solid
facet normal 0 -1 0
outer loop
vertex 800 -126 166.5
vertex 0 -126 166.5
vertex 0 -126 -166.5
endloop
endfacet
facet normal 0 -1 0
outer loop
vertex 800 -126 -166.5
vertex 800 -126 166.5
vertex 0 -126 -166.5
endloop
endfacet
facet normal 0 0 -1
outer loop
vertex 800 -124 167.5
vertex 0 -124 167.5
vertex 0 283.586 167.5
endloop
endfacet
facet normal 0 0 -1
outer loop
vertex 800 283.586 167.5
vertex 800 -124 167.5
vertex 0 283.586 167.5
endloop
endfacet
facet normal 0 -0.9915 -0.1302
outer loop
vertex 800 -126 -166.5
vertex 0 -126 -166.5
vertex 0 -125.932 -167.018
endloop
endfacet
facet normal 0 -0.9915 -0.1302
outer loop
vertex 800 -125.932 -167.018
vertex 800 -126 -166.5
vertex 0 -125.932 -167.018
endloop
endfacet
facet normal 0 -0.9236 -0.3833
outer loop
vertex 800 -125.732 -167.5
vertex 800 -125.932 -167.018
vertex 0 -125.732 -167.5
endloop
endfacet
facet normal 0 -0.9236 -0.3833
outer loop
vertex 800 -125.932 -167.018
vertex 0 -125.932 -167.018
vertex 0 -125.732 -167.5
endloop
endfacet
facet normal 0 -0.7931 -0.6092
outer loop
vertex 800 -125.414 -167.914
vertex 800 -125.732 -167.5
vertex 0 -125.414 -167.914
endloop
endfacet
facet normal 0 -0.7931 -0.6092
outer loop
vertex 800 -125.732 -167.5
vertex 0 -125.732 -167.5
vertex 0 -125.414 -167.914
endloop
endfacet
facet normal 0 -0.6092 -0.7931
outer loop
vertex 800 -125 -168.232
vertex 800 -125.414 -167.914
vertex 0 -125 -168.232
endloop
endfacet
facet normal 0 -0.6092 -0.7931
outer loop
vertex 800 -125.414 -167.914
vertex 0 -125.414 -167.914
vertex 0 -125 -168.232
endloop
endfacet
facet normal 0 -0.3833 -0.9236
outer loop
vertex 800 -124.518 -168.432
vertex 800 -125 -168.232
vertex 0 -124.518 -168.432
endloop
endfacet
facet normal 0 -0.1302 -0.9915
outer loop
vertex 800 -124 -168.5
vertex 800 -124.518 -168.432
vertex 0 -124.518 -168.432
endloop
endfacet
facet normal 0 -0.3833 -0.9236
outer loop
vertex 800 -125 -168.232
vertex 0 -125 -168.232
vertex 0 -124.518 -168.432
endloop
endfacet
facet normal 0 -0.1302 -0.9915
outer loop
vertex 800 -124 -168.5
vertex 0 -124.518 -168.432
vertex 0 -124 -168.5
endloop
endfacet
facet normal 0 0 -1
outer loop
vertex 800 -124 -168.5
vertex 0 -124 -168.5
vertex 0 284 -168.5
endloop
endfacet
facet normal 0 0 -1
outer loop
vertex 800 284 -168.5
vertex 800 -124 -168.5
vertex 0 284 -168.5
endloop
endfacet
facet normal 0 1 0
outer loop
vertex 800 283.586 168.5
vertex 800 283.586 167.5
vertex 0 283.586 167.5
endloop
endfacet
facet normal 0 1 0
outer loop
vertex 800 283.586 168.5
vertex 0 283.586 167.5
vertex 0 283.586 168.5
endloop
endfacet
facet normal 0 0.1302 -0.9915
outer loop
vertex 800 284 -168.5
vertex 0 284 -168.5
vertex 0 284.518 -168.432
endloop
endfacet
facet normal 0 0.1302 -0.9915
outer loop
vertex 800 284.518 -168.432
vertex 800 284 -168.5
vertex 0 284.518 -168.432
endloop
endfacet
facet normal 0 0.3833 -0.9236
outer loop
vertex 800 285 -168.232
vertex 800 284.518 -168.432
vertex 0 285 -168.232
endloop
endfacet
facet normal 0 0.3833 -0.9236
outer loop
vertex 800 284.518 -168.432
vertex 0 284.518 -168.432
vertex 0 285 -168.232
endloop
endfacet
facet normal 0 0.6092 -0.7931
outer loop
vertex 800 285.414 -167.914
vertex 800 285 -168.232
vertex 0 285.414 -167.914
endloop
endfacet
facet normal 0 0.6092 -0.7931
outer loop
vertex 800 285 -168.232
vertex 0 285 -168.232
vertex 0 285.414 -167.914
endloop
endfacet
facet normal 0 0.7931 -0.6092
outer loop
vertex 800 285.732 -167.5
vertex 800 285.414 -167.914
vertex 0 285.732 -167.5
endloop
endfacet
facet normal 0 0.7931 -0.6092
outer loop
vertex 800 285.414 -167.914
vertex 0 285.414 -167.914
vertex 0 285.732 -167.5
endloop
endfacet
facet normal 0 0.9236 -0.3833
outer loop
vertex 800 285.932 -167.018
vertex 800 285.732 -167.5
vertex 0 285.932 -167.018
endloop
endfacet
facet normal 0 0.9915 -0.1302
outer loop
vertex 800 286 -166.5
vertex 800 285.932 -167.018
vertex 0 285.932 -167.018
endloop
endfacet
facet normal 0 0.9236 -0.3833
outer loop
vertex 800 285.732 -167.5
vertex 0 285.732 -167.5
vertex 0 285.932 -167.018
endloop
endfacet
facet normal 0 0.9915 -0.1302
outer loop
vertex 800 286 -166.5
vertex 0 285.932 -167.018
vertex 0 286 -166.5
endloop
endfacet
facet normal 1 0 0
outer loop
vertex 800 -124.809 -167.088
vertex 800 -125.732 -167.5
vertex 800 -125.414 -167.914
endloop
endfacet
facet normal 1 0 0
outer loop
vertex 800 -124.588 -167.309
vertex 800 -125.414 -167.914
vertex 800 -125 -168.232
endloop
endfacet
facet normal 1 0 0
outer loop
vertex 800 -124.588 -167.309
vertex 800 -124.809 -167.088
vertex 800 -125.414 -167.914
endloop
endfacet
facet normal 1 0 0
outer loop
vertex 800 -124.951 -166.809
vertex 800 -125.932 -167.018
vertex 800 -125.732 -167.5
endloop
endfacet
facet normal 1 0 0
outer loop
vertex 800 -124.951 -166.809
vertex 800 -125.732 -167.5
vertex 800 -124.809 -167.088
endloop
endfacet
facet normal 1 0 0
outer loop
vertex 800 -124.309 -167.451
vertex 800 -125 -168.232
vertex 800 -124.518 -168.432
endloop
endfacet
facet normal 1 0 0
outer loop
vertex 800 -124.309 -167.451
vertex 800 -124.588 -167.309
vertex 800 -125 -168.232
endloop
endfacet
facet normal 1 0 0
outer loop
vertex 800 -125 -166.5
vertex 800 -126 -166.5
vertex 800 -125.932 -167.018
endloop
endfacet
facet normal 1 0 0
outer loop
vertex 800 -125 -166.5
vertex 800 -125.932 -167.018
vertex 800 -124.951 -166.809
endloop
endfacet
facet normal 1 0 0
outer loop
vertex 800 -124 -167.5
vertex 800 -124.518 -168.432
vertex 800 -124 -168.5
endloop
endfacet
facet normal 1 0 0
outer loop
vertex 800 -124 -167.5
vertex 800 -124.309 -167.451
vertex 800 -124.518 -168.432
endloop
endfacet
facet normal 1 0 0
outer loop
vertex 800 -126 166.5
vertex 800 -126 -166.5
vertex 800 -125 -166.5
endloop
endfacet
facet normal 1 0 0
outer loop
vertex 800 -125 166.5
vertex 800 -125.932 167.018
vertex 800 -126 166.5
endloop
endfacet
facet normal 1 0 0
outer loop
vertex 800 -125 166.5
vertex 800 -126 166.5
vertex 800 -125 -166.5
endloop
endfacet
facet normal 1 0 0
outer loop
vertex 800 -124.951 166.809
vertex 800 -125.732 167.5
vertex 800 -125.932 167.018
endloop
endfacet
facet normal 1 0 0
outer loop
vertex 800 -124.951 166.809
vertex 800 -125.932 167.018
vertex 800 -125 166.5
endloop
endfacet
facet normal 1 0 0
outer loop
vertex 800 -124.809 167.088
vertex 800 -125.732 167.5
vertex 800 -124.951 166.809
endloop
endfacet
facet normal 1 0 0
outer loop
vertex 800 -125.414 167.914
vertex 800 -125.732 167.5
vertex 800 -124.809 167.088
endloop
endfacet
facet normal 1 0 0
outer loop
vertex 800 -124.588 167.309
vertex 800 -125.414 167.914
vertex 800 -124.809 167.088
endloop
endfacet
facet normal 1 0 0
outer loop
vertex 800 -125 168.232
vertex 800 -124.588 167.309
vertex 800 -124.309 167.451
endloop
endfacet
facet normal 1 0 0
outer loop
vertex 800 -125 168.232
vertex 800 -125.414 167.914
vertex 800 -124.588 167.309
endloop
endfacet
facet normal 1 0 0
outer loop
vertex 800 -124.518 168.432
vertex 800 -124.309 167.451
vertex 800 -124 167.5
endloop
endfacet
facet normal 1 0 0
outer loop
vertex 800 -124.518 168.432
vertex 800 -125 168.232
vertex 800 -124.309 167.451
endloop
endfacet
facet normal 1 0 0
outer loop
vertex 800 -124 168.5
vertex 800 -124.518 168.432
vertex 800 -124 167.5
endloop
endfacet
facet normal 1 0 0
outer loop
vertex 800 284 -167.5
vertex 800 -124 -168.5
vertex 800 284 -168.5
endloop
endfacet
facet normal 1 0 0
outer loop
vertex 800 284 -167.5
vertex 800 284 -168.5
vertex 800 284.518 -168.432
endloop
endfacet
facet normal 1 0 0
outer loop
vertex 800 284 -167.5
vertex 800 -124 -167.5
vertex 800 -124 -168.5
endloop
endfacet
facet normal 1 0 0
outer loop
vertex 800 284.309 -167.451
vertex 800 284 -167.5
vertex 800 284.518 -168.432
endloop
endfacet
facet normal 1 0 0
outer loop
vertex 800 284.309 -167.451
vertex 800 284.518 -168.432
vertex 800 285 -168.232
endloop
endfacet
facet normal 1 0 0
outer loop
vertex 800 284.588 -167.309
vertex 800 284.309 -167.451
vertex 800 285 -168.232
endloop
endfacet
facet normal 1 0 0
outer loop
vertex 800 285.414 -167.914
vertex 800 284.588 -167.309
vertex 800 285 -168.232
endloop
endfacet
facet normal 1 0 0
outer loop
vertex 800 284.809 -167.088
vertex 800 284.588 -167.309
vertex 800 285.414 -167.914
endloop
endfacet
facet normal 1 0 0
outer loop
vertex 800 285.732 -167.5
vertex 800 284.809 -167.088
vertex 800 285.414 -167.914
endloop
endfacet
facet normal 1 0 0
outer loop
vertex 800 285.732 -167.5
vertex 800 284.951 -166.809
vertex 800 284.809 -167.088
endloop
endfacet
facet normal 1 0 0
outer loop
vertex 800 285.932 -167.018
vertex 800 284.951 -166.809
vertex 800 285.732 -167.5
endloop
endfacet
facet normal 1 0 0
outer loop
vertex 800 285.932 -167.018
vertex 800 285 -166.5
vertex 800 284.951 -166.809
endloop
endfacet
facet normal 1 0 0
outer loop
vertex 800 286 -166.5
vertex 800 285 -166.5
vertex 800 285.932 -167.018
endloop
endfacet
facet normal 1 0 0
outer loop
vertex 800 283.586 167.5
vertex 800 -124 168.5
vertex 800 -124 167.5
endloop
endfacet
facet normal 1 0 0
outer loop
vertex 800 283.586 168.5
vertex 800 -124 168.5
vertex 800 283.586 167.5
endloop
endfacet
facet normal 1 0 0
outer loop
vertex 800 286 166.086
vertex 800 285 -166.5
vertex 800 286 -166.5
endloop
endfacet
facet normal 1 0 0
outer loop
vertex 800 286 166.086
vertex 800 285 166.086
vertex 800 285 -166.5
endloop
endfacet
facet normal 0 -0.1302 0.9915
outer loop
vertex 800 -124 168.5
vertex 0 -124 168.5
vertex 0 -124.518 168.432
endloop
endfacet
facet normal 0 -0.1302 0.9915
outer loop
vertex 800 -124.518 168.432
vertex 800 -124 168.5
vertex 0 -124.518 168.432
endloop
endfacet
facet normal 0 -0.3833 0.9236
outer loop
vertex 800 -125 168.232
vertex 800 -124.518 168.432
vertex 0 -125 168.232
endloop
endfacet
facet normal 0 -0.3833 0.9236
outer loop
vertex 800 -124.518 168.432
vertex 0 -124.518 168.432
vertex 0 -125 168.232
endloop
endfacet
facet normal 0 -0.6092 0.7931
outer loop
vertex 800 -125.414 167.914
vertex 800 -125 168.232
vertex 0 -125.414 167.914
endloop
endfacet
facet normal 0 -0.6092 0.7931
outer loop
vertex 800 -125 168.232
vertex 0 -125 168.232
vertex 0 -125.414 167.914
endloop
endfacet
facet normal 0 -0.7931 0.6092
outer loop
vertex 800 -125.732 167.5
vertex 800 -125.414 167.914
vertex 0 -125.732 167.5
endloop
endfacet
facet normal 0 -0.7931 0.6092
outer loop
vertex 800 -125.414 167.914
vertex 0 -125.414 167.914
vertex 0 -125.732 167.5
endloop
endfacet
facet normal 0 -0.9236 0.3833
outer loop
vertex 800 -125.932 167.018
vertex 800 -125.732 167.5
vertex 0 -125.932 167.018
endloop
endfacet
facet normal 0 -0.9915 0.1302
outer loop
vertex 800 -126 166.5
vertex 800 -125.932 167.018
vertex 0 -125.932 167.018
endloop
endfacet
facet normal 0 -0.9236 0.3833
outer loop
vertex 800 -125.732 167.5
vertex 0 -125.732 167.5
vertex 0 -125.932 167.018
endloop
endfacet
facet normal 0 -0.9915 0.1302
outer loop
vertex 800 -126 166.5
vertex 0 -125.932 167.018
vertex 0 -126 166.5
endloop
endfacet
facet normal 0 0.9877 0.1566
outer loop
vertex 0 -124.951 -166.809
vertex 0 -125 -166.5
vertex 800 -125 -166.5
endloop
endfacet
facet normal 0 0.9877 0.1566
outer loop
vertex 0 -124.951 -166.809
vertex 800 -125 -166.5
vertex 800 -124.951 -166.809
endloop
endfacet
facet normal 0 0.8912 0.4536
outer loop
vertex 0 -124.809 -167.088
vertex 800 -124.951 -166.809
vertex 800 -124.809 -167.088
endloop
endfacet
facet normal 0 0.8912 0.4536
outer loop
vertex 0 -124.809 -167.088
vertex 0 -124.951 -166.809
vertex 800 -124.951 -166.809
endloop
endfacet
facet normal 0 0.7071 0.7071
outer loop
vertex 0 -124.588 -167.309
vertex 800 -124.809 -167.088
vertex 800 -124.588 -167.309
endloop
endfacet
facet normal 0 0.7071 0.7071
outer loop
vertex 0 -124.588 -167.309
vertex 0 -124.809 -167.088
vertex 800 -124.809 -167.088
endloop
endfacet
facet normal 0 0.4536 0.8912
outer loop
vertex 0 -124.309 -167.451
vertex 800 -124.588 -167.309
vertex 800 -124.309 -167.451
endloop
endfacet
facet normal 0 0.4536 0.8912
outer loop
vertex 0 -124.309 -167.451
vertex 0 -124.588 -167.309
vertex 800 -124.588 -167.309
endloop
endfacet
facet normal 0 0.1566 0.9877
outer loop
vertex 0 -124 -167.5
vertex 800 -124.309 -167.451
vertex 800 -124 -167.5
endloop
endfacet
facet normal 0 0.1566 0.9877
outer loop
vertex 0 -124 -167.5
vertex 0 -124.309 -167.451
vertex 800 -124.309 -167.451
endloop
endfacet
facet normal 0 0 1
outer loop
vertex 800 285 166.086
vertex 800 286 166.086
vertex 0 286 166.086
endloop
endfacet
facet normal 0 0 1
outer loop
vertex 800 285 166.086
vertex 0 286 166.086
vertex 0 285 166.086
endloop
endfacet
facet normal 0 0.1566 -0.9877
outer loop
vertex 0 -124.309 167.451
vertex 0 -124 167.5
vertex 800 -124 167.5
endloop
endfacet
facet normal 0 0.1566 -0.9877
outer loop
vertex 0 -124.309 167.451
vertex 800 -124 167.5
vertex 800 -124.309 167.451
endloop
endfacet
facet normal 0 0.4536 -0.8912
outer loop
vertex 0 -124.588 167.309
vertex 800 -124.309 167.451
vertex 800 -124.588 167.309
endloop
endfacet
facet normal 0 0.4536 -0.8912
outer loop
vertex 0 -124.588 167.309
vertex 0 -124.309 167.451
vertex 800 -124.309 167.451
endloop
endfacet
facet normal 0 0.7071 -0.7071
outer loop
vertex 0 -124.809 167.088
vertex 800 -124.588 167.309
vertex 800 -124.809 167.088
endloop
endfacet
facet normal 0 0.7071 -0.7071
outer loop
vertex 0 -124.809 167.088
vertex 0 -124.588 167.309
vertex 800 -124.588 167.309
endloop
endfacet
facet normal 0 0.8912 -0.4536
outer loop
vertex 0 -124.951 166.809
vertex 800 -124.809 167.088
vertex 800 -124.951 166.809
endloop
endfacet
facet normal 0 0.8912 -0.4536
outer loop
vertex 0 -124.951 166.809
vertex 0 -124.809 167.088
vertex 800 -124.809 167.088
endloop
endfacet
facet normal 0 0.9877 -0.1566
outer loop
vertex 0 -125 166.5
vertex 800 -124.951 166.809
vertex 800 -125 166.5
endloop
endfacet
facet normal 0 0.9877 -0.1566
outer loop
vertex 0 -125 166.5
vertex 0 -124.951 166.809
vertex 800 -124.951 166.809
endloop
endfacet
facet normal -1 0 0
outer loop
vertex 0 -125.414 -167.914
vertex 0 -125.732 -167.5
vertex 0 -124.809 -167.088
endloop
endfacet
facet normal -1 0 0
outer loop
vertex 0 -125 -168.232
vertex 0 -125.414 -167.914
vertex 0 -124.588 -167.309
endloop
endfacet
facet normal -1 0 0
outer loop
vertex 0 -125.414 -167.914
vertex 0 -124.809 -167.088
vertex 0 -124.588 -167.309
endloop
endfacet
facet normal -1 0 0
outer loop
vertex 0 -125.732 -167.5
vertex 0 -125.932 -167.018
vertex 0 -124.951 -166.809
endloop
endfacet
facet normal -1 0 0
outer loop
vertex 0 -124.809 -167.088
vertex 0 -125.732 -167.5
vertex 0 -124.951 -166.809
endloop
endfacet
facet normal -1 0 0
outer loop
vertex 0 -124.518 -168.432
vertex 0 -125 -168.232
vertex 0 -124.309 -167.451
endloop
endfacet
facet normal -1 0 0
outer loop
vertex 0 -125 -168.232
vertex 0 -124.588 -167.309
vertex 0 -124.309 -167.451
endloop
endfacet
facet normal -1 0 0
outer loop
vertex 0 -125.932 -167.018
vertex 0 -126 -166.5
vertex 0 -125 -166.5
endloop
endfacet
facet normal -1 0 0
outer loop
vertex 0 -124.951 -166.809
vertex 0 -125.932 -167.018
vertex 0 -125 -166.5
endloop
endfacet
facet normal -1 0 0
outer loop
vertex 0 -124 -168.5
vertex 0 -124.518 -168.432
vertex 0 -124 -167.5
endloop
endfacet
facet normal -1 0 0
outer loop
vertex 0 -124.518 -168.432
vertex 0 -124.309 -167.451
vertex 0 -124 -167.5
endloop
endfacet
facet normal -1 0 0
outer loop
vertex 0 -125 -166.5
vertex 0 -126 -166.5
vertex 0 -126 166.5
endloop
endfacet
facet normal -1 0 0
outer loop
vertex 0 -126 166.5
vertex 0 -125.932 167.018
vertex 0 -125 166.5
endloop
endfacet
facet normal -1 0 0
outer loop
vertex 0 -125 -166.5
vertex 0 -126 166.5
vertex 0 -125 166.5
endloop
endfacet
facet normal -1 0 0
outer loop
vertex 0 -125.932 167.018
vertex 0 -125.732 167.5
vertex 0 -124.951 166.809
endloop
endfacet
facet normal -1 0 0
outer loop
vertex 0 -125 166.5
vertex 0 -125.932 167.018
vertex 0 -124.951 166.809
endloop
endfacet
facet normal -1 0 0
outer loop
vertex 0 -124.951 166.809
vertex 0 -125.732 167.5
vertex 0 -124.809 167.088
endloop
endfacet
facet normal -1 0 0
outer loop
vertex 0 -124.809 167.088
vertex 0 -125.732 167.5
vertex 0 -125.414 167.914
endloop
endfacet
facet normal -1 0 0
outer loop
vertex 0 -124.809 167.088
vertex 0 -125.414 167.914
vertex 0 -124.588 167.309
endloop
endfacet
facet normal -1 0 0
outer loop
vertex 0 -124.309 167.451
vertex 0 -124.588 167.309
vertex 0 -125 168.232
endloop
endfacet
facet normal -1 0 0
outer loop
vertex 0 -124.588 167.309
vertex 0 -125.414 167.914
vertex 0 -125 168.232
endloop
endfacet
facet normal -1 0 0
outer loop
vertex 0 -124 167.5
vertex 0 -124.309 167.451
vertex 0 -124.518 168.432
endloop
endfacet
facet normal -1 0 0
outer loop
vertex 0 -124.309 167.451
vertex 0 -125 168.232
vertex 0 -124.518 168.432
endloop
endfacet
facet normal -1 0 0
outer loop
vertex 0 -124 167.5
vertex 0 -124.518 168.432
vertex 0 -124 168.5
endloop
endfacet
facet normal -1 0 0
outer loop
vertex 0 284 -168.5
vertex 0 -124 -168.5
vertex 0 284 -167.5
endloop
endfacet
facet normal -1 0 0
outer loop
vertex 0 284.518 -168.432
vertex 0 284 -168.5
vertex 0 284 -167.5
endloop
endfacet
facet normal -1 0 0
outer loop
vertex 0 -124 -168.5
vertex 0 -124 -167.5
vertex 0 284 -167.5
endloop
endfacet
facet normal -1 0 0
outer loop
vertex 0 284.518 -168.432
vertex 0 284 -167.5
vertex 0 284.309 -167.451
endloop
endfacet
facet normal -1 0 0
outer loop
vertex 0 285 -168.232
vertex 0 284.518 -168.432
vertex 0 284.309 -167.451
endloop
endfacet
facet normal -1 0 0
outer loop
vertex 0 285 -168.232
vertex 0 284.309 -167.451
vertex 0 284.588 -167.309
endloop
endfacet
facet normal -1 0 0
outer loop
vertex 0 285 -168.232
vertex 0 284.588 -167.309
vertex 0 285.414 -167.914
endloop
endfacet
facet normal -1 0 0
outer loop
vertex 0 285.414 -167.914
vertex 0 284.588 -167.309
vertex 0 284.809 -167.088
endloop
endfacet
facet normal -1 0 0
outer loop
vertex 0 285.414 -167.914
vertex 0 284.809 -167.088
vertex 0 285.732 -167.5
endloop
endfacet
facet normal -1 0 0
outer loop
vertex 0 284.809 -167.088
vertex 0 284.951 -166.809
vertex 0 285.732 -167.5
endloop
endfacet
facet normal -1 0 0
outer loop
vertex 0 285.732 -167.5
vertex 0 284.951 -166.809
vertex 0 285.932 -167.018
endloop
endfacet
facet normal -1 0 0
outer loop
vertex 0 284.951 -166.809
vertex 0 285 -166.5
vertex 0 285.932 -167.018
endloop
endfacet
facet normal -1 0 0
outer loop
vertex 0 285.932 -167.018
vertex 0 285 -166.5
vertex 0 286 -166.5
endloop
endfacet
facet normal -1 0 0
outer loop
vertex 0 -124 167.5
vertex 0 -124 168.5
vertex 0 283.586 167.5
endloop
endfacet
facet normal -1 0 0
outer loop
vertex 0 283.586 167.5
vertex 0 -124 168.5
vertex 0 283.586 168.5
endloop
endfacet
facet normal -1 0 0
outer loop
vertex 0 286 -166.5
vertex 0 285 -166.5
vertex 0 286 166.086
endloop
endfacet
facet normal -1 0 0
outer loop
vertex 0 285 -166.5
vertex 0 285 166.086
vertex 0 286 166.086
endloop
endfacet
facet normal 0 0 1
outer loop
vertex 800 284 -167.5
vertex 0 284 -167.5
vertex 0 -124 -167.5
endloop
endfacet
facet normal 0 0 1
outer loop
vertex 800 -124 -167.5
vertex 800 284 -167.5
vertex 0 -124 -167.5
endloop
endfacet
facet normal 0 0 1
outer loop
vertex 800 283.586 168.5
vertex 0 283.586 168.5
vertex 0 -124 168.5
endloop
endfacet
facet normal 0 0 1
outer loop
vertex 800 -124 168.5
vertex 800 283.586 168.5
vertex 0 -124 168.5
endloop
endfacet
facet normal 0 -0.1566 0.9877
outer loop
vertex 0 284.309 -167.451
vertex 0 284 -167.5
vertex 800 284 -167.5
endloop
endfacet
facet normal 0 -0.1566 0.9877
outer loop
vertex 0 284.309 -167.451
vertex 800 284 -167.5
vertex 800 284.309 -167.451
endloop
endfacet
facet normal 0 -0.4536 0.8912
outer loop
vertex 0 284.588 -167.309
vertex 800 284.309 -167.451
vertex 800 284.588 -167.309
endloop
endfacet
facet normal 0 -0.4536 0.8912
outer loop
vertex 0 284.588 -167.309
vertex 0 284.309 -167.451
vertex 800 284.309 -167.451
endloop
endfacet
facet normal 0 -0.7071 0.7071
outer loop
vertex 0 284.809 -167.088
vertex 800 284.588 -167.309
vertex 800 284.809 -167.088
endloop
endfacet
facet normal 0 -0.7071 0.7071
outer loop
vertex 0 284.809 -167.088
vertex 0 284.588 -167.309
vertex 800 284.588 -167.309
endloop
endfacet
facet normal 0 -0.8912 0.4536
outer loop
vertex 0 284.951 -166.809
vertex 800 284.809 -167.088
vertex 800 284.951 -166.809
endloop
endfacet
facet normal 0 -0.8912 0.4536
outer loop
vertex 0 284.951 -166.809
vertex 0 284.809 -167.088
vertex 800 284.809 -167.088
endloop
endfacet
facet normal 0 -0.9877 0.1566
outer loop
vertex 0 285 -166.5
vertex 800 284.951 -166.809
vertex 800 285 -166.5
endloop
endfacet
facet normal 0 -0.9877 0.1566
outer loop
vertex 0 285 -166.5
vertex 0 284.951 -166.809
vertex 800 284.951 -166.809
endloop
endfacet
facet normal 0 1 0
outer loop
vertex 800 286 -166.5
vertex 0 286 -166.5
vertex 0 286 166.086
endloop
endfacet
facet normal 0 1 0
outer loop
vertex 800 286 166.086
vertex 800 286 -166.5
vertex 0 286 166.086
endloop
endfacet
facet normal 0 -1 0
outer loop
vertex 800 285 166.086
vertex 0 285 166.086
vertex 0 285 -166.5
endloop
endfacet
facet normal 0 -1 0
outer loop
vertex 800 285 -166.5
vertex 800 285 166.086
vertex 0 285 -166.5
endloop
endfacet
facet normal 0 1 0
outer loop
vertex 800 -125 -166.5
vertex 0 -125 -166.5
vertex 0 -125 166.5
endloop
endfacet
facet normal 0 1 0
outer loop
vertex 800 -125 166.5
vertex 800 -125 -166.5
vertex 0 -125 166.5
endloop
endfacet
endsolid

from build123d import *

# Parameters (mm, degrees)
SKETCH1_W              = 800
SKETCH1_H              = 410
BOSS_EXTRUDE1_DEPTH    = 167.5
CONVERT_SOLID1_DEPTH   = 800
CONVERT_SOLID1_2_DEPTH = 800


# Read off the part's stored shape, not the designer's step: Convert-Solid1
with BuildPart() as part:
    # Sketch1 → Boss-Extrude1 (new, symmetric)
    with BuildSketch(Plane.XY):
        with Locations((400, 80)):
            Rectangle(SKETCH1_W, SKETCH1_H)
    extrude(amount=BOSS_EXTRUDE1_DEPTH, both=True)

    # Convert-Solid1 outline → Convert-Solid1 (cut)
    with BuildSketch(Plane.YZ):
        with BuildLine():
            Line((285, 167.5), (-124, 167.5))
            ThreePointArc((-124, 167.5), (-124.707106781, 167.207106781), (-125, 166.5))
            Line((-125, 166.5), (-125, -166.5))
            ThreePointArc((-125, -166.5), (-124.707106781, -167.207106781), (-124, -167.5))
            Line((-124, -167.5), (284, -167.5))
            ThreePointArc((284, -167.5), (284.707106781, -167.207106781), (285, -166.5))
            Line((285, -166.5), (285, 167.5))
        make_face()
    extrude(amount=CONVERT_SOLID1_DEPTH, mode=Mode.SUBTRACT)

    # Convert-Solid1 2 outline → Convert-Solid1 2 (add)
    with BuildSketch(Plane.YZ):
        with BuildLine():
            Line((-125, 167.5), (283.585786438, 167.5))
            Line((283.585786438, 167.5), (283.585786438, 168.5))
            Line((283.585786438, 168.5), (-124, 168.5))
            ThreePointArc((-124, 168.5), (-125.414213562, 167.914213562), (-126, 166.5))
            Line((-126, 166.5), (-126, -166.5))
            ThreePointArc((-126, -166.5), (-125.414213562, -167.914213562), (-124, -168.5))
            Line((-124, -168.5), (284, -168.5))
            ThreePointArc((284, -168.5), (285.414213562, -167.914213562), (286, -166.5))
            Line((286, -166.5), (286, 166.085786438))
            Line((286, 166.085786438), (285, 166.085786438))
            Line((285, 166.085786438), (285, -167.5))
            Line((285, -167.5), (-125, -167.5))
            Line((-125, -167.5), (-125, 167.5))
        make_face()
    extrude(amount=CONVERT_SOLID1_2_DEPTH)


solid = part.part
